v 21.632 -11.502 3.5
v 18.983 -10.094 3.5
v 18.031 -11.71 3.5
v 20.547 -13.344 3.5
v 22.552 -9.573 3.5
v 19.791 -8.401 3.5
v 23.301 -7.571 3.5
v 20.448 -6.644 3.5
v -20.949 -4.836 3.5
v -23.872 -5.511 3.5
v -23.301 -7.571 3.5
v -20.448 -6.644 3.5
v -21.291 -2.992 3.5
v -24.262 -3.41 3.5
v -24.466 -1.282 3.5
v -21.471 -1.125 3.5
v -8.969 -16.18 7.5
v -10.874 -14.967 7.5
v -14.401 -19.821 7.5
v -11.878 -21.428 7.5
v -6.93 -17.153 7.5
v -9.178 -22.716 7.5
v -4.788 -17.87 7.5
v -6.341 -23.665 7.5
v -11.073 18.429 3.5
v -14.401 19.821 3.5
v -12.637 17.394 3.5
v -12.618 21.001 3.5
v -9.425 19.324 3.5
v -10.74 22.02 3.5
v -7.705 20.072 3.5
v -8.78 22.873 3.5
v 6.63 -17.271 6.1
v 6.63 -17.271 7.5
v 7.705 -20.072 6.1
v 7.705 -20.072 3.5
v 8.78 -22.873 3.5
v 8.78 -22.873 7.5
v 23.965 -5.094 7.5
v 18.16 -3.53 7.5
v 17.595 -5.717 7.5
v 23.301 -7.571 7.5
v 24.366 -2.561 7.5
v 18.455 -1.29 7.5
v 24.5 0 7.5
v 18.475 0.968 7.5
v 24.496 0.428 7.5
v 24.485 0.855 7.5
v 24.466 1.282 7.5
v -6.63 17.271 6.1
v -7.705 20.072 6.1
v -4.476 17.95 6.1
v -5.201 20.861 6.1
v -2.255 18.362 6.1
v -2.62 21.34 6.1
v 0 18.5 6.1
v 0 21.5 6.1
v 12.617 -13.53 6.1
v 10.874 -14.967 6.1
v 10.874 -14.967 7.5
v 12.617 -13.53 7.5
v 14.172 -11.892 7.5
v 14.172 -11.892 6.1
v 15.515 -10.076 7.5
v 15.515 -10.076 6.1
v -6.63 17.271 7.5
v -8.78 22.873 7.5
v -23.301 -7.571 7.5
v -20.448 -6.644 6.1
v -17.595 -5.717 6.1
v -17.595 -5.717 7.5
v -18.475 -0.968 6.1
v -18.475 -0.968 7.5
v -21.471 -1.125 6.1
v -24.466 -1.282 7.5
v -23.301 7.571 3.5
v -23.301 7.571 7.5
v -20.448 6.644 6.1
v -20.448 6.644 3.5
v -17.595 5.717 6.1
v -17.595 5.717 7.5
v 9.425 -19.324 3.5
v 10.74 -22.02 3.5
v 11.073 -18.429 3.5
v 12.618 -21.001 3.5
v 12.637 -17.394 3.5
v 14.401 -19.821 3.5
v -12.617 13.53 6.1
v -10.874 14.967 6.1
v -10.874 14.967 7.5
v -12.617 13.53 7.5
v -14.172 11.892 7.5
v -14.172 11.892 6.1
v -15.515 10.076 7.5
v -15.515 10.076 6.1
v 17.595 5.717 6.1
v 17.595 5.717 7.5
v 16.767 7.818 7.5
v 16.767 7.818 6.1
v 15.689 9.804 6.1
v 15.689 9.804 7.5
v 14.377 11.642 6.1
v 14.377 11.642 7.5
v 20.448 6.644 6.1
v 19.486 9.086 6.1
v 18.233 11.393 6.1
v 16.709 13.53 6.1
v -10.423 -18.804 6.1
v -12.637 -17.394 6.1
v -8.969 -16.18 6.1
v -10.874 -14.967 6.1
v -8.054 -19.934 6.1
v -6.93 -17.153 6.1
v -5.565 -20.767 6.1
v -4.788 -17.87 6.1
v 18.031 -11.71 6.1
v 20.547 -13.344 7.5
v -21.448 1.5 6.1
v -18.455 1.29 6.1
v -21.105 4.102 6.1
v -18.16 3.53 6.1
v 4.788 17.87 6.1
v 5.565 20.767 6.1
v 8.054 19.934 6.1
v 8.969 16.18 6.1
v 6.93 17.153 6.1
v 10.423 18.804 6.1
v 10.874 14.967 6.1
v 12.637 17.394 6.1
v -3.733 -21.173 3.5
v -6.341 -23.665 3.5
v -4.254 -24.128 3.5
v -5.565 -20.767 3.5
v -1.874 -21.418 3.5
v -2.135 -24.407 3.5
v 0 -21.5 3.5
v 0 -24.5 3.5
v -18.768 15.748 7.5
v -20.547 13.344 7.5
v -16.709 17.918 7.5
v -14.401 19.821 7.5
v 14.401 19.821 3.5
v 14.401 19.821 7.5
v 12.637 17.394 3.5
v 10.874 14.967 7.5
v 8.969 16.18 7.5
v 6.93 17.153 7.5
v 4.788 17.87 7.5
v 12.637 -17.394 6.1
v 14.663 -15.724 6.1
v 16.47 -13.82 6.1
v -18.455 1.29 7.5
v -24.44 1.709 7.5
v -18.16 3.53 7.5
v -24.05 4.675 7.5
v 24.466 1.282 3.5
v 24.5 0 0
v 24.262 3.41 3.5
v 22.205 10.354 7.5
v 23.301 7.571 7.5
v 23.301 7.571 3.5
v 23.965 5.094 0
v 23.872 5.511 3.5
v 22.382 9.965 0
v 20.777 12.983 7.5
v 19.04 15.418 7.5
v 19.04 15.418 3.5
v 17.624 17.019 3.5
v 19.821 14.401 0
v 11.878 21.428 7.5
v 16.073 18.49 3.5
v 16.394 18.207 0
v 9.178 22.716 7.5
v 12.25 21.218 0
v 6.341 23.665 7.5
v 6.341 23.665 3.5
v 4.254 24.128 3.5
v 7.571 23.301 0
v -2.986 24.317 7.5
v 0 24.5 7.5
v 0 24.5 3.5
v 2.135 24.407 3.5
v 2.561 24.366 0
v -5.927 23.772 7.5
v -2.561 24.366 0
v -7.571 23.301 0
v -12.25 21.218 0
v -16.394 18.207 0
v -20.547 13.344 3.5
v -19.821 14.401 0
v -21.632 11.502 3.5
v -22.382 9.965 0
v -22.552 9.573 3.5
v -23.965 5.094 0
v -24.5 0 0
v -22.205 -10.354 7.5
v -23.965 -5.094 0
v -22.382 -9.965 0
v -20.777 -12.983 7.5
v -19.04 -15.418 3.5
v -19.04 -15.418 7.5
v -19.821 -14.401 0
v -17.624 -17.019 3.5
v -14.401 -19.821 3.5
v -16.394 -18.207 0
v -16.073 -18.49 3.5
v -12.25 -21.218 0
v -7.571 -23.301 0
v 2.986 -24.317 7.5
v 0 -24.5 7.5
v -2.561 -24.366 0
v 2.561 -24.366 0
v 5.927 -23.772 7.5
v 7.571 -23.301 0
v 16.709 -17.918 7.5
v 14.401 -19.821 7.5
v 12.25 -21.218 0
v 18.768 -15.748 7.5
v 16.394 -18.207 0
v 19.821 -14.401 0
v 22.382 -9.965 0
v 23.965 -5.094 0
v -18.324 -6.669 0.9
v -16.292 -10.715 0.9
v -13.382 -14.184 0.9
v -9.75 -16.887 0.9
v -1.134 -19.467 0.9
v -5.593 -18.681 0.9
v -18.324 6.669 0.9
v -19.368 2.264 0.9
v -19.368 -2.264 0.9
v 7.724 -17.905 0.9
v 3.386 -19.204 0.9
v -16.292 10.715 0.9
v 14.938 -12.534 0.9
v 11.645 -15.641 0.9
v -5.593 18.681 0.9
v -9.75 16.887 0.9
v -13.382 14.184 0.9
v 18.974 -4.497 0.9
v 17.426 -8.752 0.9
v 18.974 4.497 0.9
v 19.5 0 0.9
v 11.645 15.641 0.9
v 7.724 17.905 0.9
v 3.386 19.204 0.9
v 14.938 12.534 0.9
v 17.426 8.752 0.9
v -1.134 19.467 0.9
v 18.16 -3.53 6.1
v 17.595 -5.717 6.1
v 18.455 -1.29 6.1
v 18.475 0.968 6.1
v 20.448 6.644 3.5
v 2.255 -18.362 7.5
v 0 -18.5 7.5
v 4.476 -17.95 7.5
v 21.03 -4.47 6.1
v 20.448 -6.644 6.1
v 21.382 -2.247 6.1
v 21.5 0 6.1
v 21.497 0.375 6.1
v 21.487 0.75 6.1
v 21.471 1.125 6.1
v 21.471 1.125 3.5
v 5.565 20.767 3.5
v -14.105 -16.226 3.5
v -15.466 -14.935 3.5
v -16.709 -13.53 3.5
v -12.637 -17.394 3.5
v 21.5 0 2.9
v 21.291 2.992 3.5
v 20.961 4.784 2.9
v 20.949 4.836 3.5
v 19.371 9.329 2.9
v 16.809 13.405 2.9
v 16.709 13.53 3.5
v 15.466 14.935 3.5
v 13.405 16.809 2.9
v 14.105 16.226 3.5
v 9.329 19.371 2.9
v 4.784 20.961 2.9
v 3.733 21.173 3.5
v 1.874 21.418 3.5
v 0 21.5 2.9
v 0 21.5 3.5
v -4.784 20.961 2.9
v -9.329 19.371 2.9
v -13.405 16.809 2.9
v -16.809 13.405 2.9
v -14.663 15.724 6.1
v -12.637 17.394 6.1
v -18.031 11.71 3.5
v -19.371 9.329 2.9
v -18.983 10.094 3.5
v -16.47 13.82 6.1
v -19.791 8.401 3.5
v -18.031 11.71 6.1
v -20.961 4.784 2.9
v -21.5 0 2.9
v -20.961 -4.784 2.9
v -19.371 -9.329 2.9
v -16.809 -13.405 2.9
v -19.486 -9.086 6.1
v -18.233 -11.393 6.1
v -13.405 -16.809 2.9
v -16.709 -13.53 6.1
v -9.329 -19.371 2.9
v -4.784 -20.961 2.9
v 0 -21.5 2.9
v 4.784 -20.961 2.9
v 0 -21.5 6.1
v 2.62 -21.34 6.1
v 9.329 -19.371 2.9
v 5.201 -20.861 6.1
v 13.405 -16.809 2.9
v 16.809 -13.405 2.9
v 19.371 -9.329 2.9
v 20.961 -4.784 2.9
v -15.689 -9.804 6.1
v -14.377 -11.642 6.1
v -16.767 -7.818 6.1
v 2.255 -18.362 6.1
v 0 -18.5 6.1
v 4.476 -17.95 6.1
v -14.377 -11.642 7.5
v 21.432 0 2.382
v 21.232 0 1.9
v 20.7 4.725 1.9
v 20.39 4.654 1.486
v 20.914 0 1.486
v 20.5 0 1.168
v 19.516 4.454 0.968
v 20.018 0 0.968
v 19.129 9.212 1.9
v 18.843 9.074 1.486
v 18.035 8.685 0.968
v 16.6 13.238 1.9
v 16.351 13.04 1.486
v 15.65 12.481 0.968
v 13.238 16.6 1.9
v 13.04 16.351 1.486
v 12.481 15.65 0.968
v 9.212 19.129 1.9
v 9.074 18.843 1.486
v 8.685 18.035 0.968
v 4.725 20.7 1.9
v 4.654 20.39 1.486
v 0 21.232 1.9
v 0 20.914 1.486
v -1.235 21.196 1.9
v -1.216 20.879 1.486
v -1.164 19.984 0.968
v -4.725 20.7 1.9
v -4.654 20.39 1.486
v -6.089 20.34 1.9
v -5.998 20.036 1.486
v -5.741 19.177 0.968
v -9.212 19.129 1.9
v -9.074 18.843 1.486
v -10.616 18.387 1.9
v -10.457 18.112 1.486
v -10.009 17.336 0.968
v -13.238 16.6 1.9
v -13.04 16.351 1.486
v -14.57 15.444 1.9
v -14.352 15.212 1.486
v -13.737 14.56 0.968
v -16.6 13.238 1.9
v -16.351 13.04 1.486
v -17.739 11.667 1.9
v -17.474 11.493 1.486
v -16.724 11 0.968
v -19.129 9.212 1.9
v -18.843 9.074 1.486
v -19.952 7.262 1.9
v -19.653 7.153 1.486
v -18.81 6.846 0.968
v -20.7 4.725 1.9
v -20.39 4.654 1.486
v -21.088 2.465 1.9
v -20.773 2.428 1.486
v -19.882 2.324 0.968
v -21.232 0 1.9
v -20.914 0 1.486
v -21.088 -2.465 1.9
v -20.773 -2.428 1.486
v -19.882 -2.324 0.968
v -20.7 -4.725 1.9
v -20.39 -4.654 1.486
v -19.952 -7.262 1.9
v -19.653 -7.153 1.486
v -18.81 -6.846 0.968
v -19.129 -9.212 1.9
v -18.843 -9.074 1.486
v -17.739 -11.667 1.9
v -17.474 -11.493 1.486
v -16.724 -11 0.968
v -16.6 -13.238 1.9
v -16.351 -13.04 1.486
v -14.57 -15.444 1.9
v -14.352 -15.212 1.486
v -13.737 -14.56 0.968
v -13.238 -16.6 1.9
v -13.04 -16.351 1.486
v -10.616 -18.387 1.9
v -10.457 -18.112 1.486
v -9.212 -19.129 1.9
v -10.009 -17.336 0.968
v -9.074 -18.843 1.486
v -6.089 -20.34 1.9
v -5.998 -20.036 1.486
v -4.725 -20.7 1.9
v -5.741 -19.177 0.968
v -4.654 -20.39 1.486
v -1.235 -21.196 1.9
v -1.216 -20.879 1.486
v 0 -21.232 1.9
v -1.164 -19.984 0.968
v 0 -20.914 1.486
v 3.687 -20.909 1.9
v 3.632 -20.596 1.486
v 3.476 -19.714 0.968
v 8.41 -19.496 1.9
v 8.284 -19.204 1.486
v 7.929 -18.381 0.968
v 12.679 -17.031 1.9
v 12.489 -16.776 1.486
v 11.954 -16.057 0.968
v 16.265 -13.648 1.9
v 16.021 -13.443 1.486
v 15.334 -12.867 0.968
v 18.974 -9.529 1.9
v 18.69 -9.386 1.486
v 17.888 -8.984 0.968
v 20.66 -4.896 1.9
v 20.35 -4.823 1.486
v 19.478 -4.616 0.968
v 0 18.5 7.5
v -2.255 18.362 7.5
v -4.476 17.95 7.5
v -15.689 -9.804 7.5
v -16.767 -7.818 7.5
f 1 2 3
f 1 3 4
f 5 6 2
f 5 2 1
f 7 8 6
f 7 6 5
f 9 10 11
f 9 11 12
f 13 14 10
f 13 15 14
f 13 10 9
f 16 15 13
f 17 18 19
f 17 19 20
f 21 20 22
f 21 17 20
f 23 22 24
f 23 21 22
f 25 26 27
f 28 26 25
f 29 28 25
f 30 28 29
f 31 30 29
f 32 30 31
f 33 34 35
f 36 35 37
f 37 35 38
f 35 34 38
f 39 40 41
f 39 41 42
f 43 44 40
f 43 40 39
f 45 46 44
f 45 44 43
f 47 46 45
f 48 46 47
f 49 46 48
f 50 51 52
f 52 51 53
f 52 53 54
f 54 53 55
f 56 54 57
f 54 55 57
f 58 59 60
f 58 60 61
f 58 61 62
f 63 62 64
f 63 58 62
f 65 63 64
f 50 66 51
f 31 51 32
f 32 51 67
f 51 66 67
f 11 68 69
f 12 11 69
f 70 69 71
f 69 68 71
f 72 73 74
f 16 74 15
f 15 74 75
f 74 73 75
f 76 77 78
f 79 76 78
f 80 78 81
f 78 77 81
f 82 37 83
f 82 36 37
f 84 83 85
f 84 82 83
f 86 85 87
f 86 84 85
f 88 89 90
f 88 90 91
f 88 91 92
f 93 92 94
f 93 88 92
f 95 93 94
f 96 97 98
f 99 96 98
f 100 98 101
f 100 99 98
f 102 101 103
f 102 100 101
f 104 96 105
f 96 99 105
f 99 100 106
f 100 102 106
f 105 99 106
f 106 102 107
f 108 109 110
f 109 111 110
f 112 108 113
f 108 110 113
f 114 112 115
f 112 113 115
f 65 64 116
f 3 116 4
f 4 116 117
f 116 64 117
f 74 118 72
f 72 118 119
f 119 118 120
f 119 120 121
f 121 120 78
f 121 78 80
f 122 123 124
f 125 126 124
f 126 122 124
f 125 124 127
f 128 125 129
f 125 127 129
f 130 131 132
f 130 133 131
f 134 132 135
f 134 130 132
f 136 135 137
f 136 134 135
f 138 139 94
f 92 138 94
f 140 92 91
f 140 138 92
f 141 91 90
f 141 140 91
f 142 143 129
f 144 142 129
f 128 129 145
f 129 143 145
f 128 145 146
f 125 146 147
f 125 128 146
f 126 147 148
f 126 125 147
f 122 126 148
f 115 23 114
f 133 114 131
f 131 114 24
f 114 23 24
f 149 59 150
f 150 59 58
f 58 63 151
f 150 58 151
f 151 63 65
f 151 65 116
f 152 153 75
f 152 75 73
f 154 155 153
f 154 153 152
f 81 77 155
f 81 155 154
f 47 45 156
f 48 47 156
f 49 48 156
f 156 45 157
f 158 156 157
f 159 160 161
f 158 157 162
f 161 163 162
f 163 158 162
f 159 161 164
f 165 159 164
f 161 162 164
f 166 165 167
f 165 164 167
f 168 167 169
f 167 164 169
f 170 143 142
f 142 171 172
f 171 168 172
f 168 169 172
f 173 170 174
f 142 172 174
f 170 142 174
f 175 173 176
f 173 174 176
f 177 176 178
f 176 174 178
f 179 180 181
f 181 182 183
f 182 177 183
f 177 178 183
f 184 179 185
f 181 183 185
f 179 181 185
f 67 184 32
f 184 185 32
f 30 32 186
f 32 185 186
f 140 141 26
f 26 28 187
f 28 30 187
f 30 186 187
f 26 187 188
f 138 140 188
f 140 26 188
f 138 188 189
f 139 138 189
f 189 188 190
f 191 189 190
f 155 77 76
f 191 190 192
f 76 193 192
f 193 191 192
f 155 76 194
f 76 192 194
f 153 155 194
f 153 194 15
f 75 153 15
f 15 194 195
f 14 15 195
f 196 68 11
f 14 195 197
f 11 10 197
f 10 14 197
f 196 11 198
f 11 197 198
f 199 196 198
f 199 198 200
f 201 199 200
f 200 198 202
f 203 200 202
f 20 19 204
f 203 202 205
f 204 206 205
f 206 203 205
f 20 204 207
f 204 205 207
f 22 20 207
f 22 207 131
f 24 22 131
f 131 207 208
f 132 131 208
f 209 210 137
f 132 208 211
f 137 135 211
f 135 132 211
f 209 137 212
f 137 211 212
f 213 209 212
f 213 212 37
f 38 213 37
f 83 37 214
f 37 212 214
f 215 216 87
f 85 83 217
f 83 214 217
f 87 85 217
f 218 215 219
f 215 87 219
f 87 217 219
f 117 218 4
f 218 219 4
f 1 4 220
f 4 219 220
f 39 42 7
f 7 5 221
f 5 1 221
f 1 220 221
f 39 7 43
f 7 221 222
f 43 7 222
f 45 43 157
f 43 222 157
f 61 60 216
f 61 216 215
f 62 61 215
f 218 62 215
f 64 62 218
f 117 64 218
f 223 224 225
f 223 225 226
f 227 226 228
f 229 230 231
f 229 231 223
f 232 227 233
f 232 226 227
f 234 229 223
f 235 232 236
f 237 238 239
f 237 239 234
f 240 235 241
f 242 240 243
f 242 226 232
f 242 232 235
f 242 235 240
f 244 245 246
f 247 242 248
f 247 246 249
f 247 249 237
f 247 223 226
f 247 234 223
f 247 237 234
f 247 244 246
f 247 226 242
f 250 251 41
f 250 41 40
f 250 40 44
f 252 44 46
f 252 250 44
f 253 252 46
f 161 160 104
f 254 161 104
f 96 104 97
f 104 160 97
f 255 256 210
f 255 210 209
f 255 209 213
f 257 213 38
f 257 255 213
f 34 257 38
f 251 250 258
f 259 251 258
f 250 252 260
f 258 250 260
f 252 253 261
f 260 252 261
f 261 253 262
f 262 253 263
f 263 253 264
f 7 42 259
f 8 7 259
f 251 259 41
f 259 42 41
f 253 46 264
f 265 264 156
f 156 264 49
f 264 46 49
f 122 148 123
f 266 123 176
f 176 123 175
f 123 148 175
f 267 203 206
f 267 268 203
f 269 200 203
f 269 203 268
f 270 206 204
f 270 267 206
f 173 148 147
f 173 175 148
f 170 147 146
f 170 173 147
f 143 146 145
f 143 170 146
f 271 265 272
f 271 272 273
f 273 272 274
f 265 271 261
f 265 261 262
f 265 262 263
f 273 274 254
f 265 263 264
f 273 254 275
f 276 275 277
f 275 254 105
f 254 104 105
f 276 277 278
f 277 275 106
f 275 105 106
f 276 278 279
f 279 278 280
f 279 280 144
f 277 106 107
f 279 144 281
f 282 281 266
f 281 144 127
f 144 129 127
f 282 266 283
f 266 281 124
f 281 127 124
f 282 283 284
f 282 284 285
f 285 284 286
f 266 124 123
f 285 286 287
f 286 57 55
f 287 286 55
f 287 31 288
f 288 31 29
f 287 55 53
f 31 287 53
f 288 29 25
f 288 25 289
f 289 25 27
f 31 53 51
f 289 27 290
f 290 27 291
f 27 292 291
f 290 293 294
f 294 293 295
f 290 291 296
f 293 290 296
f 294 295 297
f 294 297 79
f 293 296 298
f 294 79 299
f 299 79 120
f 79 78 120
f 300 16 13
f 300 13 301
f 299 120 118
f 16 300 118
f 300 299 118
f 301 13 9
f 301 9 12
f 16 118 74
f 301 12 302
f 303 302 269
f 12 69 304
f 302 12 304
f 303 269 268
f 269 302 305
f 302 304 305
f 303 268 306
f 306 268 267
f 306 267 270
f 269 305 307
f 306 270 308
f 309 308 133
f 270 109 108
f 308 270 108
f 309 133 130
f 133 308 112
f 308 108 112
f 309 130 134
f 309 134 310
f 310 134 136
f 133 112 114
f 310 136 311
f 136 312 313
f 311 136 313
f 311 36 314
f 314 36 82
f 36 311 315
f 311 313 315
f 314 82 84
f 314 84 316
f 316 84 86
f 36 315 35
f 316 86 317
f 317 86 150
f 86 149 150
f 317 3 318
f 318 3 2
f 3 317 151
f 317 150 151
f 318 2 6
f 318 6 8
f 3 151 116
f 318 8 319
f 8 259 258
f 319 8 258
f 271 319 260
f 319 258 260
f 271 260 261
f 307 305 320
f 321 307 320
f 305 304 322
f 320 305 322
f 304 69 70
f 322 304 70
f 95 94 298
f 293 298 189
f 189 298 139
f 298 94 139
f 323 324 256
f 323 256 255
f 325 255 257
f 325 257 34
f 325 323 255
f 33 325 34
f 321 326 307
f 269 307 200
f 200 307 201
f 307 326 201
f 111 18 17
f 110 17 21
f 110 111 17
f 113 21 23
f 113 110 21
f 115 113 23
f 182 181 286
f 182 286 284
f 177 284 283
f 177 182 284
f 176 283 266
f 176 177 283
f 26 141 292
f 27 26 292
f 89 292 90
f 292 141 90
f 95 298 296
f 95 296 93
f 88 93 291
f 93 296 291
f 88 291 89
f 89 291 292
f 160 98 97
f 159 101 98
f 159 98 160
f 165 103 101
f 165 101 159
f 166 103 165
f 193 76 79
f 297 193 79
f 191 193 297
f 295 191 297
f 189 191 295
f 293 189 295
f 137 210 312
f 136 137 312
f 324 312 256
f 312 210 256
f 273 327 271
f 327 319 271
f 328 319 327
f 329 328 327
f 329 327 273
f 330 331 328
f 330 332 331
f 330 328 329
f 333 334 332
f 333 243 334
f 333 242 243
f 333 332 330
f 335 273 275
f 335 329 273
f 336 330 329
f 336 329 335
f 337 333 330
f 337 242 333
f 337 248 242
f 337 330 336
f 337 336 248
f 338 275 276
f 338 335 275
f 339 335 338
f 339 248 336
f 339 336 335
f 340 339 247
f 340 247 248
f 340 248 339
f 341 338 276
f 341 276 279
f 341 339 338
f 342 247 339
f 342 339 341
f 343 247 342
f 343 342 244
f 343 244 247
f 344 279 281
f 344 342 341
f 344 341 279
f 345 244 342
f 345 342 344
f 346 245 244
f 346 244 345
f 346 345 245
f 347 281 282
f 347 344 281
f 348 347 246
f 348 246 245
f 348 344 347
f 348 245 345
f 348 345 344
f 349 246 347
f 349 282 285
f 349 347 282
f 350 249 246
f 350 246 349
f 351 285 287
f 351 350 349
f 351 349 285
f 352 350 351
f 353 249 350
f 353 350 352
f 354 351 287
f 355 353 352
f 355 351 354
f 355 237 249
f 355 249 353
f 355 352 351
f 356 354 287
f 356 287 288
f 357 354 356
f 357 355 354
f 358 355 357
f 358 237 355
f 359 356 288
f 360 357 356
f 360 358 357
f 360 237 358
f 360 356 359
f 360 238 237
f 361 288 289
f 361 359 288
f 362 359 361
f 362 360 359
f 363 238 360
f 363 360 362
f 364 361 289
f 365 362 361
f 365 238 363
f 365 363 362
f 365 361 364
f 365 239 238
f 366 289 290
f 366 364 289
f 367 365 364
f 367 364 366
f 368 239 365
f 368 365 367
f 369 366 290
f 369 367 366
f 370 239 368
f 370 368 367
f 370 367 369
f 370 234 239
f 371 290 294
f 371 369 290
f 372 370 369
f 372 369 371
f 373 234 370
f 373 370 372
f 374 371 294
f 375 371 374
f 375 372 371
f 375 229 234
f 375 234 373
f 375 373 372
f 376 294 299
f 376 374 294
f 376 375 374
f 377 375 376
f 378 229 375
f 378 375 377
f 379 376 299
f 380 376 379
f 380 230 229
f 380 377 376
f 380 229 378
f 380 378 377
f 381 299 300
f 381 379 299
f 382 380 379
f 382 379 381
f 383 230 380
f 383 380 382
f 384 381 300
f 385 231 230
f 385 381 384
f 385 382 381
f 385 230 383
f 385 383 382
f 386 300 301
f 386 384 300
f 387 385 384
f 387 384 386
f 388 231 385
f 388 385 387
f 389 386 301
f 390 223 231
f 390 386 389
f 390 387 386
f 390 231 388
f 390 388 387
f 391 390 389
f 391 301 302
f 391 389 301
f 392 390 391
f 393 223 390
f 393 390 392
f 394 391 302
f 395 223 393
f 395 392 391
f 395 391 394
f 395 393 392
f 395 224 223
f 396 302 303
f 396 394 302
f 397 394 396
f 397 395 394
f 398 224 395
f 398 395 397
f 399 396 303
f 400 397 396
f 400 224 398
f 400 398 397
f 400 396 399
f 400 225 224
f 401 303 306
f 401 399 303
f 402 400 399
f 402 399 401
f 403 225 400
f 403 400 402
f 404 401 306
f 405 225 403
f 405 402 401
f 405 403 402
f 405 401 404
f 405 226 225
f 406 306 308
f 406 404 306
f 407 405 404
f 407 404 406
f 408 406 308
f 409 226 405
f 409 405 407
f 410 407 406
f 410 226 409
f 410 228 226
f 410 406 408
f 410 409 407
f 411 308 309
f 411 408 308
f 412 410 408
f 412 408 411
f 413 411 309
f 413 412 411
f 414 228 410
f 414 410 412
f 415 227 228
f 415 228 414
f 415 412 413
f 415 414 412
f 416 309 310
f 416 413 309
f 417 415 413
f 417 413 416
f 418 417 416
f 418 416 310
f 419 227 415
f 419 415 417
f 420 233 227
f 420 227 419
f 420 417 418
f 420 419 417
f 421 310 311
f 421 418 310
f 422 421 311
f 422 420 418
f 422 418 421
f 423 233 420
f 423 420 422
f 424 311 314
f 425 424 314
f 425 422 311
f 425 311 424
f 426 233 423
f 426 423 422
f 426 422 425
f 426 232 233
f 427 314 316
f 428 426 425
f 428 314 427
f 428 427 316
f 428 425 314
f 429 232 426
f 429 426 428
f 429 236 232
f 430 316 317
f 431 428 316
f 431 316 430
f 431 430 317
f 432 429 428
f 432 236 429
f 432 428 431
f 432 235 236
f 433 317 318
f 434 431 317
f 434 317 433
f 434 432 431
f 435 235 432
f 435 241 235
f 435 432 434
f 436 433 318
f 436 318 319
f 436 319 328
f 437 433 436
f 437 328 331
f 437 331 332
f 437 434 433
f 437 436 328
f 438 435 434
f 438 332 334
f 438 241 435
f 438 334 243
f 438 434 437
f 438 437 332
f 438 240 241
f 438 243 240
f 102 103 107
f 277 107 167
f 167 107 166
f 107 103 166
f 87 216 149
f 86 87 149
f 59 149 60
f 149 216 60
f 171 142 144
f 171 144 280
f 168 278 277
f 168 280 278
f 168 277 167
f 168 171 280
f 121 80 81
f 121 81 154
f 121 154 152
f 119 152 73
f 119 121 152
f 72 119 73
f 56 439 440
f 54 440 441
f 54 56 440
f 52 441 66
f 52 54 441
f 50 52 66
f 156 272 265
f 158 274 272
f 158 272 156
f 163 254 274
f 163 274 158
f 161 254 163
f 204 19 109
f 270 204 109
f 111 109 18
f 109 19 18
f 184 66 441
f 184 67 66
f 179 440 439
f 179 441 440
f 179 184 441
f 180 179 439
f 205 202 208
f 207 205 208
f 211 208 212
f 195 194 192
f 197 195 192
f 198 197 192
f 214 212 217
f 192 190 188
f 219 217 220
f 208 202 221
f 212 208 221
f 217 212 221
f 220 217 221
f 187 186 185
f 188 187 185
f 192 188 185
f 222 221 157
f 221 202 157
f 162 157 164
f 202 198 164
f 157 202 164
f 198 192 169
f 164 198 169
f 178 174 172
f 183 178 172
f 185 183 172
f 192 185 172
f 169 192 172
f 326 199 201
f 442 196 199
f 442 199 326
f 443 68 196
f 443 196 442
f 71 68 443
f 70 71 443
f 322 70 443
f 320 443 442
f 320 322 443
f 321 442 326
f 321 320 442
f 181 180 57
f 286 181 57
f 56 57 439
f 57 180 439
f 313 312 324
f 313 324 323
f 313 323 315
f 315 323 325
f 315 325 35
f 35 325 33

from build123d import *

# Parameters (mm, degrees)
F0_R     = 24.5
F1_DEPTH = 7.5
F2_R     = 21.5
F3_DEPTH = 6.6
F5_R     = 21.5
F5_R_2   = 18.5
F6_DEPTH = 1.4
F8_DEPTH = 4
F9_R     = 2


with BuildPart() as f1:
    # F0 (on Top) → F1 (new body)
    with BuildSketch(Plane.XY):
        Circle(F0_R)
    extrude(amount=F1_DEPTH)

    # F2 (on face) → F3 (cut)
    with BuildSketch(Plane.XY.offset(7.5)):
        Circle(F2_R)
    extrude(amount=-F3_DEPTH, mode=Mode.SUBTRACT)

    # F5 (on offset) → F6 (join, through all)
    with BuildSketch(Plane.XY.offset(6.1)):
        Circle(F5_R)
        Circle(F5_R_2, mode=Mode.SUBTRACT)
    extrude(amount=F6_DEPTH)

    # F7 (on face) → F8 (cut)
    with BuildSketch(Plane.XY.offset(7.5)):
        Polygon((0, 27.140824), (0, 0), (7.272362, 27.140824), align=None)
        Polygon((-15.952976, 21.957388), (0, 0), (-10.069512, 26.231975), align=None)
        Polygon((-25.812457, 8.386976), (0, 0), (-23.565174, 15.303403), align=None)
        Polygon((-25.812457, -8.386976), (0, 0), (-28.059741, -1.470549), align=None)
        Polygon((-15.952976, -21.957388), (0, 0), (-21.83644, -17.682801), align=None)
        Polygon((0, -27.140824), (0, 0), (-7.272362, -27.140824), align=None)
        Polygon((15.952976, -21.957388), (0, 0), (10.069512, -26.231975), align=None)
        Polygon((25.812457, -8.386976), (0, 0), (23.565174, -15.303403), align=None)
        Polygon((25.812457, 8.386976), (0, 0), (28.059741, 1.470549), align=None)
        Polygon((15.952976, 21.957388), (0, 0), (21.83644, 17.682801), align=None)
    extrude(amount=-F8_DEPTH, mode=Mode.SUBTRACT)

    # F9
    f9_edges = [f1.edges().sort_by_distance(p)[0] for p in [
        (-21.5, 0, 0.9),
    ]]
    fillet(f9_edges, radius=F9_R)


solid = f1.part
